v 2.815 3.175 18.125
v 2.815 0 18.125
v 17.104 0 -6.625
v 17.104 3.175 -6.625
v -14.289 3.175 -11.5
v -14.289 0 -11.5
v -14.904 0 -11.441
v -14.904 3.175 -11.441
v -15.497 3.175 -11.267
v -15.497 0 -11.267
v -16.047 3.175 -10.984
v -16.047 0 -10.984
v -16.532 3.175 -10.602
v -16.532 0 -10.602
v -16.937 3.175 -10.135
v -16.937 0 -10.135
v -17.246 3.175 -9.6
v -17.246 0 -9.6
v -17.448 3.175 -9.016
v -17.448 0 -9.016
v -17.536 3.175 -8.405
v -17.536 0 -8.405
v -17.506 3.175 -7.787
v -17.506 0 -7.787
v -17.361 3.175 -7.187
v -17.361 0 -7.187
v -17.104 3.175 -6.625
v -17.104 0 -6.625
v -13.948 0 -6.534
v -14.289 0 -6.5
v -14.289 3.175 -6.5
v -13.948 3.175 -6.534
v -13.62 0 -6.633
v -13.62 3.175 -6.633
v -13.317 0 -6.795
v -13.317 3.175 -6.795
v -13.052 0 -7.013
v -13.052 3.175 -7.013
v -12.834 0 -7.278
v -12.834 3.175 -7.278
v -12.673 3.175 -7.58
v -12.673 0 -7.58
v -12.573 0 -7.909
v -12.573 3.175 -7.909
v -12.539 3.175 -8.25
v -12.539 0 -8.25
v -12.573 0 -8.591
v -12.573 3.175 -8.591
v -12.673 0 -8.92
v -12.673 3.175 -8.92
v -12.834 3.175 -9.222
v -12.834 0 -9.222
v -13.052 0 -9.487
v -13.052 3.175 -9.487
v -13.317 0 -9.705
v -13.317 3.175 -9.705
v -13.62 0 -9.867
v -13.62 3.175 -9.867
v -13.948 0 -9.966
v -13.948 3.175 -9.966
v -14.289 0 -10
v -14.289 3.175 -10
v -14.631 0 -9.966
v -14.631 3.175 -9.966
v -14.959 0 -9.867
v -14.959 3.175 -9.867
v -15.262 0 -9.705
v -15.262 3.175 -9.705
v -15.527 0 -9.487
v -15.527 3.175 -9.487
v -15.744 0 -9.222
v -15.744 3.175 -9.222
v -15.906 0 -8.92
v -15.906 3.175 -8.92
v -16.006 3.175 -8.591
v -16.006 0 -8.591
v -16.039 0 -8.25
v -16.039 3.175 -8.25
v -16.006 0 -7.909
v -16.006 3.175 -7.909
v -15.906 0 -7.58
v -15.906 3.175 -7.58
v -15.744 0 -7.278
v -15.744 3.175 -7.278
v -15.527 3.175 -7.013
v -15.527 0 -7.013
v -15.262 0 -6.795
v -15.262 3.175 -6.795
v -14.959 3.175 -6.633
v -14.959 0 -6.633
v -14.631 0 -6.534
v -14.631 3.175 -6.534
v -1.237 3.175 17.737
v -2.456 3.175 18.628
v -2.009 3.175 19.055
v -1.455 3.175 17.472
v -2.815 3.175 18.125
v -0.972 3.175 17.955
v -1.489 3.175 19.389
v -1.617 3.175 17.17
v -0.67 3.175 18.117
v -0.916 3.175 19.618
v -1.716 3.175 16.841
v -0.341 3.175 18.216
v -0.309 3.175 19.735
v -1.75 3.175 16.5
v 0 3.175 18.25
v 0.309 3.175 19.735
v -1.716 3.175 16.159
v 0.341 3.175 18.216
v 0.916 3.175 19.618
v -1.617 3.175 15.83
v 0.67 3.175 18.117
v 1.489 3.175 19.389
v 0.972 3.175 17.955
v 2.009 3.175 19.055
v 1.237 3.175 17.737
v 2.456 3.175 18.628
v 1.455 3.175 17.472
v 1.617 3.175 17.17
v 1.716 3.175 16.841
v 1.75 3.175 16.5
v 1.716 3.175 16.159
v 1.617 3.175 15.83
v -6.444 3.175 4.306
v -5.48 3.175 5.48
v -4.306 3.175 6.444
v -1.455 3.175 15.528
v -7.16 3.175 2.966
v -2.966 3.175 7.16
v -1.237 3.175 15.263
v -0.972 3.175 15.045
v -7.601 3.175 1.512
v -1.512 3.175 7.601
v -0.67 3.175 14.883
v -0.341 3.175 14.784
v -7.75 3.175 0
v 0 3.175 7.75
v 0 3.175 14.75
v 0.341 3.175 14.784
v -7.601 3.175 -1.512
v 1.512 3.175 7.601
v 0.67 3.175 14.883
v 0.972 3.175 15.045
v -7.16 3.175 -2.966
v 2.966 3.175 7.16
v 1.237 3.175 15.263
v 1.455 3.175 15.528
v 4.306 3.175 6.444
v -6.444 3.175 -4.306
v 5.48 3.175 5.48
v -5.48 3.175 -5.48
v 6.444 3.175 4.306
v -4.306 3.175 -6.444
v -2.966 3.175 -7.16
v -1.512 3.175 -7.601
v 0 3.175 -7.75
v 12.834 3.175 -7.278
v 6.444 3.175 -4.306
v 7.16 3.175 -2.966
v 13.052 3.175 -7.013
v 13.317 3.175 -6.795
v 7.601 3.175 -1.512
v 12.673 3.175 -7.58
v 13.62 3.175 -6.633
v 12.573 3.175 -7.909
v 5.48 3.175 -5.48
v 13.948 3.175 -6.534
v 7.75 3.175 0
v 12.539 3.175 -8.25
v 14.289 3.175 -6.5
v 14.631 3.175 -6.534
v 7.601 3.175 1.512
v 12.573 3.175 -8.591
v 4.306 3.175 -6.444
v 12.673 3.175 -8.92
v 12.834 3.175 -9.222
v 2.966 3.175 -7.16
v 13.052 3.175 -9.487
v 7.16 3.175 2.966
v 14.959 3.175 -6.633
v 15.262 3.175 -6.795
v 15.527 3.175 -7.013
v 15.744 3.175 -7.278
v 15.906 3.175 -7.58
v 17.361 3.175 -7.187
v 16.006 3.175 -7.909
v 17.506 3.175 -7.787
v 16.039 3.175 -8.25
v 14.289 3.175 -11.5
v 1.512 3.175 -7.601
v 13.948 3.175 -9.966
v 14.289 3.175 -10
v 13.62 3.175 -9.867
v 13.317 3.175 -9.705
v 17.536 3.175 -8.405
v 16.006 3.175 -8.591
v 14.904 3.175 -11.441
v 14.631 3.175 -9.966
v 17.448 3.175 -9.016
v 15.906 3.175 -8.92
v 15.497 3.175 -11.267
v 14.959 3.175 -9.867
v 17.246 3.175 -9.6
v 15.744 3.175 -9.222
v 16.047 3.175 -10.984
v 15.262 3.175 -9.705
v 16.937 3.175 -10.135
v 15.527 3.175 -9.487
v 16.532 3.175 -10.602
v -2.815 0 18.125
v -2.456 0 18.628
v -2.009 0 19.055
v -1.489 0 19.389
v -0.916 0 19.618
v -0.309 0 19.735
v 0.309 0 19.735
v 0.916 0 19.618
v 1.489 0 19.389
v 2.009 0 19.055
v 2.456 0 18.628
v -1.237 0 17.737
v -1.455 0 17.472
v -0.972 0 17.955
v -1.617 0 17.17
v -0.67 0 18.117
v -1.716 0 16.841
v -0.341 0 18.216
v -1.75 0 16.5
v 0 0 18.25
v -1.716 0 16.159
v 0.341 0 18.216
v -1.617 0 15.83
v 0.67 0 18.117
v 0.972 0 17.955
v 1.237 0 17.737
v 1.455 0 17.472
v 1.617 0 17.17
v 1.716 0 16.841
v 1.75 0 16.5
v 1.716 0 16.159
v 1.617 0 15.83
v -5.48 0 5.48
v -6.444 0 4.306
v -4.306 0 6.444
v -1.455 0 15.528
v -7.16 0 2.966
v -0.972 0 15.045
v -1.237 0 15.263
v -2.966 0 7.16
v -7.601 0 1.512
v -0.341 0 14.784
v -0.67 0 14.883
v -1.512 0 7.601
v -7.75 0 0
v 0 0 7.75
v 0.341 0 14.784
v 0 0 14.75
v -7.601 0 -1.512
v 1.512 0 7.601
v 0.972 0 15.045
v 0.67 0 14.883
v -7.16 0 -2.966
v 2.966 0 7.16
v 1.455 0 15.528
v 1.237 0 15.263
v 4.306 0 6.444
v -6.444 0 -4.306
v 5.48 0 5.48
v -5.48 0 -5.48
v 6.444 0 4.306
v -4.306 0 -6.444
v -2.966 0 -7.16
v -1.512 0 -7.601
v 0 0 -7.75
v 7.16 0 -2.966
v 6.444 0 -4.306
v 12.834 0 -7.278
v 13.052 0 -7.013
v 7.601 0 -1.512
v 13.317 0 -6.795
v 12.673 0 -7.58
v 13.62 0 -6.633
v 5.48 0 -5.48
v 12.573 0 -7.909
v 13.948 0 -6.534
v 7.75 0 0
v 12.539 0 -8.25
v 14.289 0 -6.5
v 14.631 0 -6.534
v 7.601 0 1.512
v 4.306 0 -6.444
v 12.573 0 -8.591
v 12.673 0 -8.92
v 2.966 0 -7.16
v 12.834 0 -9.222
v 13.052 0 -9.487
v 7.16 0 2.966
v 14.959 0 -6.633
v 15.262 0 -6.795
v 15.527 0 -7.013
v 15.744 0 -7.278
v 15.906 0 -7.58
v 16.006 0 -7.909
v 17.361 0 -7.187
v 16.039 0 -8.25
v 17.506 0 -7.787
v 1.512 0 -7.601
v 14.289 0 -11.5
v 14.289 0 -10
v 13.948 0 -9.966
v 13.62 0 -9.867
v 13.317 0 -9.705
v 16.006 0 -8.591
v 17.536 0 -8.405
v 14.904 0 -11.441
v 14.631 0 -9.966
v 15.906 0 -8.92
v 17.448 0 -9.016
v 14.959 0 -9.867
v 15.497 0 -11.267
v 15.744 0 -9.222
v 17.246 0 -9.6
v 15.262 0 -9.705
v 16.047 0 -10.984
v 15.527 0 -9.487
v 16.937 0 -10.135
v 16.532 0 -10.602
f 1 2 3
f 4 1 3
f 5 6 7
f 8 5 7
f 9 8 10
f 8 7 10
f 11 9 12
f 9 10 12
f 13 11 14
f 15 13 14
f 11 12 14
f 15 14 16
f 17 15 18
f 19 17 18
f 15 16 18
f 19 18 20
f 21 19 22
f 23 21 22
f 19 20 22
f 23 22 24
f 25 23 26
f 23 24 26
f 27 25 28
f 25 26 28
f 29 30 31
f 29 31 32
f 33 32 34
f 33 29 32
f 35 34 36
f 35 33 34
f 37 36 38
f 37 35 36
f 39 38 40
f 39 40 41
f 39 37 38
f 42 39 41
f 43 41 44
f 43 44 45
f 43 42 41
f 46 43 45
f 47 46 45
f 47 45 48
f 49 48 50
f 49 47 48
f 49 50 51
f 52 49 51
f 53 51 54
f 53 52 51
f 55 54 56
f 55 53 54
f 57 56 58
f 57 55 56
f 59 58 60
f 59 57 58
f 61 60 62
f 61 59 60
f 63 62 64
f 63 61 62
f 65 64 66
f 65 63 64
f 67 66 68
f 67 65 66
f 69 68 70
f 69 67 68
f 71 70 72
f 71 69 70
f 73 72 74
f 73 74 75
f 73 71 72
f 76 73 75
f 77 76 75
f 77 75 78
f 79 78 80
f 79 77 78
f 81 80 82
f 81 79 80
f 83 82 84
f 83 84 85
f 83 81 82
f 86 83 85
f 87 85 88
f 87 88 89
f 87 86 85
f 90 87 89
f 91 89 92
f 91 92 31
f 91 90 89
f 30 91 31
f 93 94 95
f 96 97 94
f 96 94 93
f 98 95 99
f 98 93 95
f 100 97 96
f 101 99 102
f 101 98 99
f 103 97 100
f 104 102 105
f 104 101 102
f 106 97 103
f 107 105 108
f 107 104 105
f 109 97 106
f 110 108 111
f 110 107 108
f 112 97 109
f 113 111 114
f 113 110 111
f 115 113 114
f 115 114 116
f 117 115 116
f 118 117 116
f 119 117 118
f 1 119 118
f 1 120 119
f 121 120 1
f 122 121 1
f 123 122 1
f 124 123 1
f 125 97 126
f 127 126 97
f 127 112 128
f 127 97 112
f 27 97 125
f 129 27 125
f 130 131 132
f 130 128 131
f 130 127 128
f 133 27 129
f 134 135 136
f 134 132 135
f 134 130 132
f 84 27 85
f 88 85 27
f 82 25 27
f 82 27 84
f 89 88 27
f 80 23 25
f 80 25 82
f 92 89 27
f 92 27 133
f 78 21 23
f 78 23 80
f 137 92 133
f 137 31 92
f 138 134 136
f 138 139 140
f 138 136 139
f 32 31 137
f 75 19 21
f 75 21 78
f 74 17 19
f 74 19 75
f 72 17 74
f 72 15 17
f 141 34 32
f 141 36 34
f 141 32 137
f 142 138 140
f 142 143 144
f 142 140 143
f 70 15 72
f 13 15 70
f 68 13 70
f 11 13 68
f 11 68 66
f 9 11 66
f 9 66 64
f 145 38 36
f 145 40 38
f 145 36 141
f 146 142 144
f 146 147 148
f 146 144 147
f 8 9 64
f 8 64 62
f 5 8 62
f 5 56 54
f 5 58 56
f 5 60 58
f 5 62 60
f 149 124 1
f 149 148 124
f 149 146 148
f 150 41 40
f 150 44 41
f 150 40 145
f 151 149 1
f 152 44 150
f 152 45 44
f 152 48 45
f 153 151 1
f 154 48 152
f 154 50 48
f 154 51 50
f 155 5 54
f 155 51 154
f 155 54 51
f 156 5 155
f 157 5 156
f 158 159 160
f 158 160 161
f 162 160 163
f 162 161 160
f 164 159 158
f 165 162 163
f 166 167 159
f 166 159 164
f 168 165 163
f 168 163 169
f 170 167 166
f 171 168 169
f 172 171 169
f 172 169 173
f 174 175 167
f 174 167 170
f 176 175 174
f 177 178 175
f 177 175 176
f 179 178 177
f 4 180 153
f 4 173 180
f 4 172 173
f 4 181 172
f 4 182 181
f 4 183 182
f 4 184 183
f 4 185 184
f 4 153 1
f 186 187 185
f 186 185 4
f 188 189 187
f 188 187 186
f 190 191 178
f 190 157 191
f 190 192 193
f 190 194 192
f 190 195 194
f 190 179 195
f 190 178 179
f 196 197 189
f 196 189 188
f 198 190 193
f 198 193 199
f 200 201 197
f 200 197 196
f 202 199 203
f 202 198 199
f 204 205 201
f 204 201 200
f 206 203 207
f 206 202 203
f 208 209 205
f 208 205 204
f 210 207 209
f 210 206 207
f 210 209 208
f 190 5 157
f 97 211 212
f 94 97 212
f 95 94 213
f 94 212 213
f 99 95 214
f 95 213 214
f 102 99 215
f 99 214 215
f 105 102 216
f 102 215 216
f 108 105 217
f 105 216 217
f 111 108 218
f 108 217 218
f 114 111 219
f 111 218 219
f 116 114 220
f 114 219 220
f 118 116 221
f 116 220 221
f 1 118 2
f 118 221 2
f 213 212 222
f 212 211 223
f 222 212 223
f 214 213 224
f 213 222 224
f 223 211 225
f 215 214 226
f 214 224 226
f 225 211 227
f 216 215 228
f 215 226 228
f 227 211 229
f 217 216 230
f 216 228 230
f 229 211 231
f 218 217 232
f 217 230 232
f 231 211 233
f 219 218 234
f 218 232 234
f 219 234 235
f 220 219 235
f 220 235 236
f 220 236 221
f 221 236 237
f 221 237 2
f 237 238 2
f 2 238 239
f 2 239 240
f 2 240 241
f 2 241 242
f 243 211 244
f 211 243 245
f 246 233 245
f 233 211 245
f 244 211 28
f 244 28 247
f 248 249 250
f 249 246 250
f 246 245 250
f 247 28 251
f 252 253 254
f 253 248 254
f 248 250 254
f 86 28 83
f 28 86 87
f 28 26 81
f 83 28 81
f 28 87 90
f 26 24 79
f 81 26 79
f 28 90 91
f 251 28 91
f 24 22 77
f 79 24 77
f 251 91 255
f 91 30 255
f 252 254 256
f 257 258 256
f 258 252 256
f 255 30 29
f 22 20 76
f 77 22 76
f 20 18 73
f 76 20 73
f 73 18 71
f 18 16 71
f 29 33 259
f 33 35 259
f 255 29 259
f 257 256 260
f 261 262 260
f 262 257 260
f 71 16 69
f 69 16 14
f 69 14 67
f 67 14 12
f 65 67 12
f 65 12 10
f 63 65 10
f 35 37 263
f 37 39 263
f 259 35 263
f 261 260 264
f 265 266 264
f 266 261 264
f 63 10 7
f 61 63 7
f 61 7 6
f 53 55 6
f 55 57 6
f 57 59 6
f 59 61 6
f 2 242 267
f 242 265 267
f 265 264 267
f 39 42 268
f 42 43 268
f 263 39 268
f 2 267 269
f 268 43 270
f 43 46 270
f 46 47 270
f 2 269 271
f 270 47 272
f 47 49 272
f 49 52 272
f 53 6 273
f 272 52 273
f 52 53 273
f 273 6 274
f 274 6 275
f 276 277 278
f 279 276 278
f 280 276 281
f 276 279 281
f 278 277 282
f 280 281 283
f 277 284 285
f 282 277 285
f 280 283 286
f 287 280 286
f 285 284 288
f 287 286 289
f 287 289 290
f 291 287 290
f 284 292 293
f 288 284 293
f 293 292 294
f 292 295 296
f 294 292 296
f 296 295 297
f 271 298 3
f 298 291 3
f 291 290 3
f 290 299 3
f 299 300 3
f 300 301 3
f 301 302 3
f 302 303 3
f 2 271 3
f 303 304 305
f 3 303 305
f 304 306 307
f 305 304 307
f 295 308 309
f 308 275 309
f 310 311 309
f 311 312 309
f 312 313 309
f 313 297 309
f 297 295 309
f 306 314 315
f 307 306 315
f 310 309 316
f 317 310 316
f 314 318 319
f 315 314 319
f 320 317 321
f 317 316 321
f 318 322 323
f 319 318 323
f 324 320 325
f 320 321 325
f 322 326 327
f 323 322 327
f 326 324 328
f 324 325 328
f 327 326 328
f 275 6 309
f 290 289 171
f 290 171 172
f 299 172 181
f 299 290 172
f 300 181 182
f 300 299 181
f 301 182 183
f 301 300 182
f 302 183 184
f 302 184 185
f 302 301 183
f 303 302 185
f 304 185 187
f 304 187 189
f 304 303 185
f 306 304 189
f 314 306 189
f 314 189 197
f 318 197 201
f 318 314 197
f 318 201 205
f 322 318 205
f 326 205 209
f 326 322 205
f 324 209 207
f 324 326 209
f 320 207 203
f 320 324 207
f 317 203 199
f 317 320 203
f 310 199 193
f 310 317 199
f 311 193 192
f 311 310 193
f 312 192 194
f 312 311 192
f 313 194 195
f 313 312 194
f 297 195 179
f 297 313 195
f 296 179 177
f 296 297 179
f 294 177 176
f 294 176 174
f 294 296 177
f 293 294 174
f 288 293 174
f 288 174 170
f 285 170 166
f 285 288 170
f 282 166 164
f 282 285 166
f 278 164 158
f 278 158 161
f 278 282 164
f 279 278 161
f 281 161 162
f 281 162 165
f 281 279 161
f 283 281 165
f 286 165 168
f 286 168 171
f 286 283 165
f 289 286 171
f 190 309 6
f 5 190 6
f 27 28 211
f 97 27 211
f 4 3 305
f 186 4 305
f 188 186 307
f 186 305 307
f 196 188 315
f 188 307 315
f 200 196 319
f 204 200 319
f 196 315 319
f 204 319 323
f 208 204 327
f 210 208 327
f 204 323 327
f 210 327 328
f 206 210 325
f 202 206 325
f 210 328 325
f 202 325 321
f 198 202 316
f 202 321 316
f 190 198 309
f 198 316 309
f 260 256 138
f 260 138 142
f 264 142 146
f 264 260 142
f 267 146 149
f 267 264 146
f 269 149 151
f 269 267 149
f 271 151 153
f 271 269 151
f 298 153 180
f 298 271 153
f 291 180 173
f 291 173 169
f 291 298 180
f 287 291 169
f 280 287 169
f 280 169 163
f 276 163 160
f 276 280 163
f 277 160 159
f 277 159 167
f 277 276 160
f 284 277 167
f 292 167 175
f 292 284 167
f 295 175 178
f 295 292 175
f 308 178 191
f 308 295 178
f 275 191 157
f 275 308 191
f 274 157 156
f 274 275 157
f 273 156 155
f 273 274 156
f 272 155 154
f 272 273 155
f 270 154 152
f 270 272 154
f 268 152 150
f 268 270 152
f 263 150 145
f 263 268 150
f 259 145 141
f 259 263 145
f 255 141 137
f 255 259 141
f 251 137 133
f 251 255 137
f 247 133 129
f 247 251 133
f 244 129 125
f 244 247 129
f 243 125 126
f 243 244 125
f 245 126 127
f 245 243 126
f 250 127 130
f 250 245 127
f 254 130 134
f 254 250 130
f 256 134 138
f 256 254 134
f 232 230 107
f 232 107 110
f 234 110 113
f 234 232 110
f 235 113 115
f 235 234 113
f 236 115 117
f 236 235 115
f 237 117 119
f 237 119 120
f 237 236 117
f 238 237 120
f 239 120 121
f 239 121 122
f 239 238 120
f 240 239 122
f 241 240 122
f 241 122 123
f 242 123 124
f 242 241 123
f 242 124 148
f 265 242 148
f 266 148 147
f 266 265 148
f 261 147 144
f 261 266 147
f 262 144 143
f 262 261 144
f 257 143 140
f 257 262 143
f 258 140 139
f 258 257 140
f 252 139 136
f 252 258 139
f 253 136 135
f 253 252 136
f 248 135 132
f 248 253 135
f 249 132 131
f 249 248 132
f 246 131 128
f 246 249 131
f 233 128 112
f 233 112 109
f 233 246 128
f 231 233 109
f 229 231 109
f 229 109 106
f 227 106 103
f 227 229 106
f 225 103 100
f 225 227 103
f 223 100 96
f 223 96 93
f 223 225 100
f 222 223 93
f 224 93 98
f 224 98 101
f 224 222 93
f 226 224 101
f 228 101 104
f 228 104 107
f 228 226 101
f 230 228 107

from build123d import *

# Parameters (mm, degrees)
SKETCH1_R           = 7.75
SKETCH1_R_2         = 1.75
BOSS_EXTRUDE1_DEPTH = 3.175


with BuildPart() as part:
    # Sketch1 → Boss-Extrude1 (new body)
    with BuildSketch(Plane(origin=(0, 0, 0), x_dir=(1, 0, 0), z_dir=(0, 1, 0))):
        with BuildLine():
            Line((-17.104001725, 6.625), (-2.814582562, -18.125))
            ThreePointArc((-2.814582562, -18.125), (0, -19.75), (2.814582562, -18.125))
            Line((2.814582562, -18.125), (17.104001725, 6.625))
            ThreePointArc((17.104001725, 6.625), (17.104001725, 9.875), (14.289419162, 11.5))
            Line((14.289419162, 11.5), (-14.289419162, 11.5))
            ThreePointArc((-14.289419162, 11.5), (-17.104001725, 9.875), (-17.104001725, 6.625))
        make_face()
        with Locations(Location((0, 0, 0), (0, 0, 270))):  # turned: the seam where the file's is
            Circle(SKETCH1_R, mode=Mode.SUBTRACT)
        with Locations(Location((-14.289419162, 8.25, 0), (0, 0, 270))):  # turned: the seam where the file's is
            Circle(SKETCH1_R_2, mode=Mode.SUBTRACT)
        with Locations(Location((0, -16.5, 0), (0, 0, 270))):  # turned: the seam where the file's is
            Circle(SKETCH1_R_2, mode=Mode.SUBTRACT)
        with Locations(Location((14.289419162, 8.25, 0), (0, 0, 270))):  # turned: the seam where the file's is
            Circle(SKETCH1_R_2, mode=Mode.SUBTRACT)
    extrude(amount=BOSS_EXTRUDE1_DEPTH)


solid = part.part
